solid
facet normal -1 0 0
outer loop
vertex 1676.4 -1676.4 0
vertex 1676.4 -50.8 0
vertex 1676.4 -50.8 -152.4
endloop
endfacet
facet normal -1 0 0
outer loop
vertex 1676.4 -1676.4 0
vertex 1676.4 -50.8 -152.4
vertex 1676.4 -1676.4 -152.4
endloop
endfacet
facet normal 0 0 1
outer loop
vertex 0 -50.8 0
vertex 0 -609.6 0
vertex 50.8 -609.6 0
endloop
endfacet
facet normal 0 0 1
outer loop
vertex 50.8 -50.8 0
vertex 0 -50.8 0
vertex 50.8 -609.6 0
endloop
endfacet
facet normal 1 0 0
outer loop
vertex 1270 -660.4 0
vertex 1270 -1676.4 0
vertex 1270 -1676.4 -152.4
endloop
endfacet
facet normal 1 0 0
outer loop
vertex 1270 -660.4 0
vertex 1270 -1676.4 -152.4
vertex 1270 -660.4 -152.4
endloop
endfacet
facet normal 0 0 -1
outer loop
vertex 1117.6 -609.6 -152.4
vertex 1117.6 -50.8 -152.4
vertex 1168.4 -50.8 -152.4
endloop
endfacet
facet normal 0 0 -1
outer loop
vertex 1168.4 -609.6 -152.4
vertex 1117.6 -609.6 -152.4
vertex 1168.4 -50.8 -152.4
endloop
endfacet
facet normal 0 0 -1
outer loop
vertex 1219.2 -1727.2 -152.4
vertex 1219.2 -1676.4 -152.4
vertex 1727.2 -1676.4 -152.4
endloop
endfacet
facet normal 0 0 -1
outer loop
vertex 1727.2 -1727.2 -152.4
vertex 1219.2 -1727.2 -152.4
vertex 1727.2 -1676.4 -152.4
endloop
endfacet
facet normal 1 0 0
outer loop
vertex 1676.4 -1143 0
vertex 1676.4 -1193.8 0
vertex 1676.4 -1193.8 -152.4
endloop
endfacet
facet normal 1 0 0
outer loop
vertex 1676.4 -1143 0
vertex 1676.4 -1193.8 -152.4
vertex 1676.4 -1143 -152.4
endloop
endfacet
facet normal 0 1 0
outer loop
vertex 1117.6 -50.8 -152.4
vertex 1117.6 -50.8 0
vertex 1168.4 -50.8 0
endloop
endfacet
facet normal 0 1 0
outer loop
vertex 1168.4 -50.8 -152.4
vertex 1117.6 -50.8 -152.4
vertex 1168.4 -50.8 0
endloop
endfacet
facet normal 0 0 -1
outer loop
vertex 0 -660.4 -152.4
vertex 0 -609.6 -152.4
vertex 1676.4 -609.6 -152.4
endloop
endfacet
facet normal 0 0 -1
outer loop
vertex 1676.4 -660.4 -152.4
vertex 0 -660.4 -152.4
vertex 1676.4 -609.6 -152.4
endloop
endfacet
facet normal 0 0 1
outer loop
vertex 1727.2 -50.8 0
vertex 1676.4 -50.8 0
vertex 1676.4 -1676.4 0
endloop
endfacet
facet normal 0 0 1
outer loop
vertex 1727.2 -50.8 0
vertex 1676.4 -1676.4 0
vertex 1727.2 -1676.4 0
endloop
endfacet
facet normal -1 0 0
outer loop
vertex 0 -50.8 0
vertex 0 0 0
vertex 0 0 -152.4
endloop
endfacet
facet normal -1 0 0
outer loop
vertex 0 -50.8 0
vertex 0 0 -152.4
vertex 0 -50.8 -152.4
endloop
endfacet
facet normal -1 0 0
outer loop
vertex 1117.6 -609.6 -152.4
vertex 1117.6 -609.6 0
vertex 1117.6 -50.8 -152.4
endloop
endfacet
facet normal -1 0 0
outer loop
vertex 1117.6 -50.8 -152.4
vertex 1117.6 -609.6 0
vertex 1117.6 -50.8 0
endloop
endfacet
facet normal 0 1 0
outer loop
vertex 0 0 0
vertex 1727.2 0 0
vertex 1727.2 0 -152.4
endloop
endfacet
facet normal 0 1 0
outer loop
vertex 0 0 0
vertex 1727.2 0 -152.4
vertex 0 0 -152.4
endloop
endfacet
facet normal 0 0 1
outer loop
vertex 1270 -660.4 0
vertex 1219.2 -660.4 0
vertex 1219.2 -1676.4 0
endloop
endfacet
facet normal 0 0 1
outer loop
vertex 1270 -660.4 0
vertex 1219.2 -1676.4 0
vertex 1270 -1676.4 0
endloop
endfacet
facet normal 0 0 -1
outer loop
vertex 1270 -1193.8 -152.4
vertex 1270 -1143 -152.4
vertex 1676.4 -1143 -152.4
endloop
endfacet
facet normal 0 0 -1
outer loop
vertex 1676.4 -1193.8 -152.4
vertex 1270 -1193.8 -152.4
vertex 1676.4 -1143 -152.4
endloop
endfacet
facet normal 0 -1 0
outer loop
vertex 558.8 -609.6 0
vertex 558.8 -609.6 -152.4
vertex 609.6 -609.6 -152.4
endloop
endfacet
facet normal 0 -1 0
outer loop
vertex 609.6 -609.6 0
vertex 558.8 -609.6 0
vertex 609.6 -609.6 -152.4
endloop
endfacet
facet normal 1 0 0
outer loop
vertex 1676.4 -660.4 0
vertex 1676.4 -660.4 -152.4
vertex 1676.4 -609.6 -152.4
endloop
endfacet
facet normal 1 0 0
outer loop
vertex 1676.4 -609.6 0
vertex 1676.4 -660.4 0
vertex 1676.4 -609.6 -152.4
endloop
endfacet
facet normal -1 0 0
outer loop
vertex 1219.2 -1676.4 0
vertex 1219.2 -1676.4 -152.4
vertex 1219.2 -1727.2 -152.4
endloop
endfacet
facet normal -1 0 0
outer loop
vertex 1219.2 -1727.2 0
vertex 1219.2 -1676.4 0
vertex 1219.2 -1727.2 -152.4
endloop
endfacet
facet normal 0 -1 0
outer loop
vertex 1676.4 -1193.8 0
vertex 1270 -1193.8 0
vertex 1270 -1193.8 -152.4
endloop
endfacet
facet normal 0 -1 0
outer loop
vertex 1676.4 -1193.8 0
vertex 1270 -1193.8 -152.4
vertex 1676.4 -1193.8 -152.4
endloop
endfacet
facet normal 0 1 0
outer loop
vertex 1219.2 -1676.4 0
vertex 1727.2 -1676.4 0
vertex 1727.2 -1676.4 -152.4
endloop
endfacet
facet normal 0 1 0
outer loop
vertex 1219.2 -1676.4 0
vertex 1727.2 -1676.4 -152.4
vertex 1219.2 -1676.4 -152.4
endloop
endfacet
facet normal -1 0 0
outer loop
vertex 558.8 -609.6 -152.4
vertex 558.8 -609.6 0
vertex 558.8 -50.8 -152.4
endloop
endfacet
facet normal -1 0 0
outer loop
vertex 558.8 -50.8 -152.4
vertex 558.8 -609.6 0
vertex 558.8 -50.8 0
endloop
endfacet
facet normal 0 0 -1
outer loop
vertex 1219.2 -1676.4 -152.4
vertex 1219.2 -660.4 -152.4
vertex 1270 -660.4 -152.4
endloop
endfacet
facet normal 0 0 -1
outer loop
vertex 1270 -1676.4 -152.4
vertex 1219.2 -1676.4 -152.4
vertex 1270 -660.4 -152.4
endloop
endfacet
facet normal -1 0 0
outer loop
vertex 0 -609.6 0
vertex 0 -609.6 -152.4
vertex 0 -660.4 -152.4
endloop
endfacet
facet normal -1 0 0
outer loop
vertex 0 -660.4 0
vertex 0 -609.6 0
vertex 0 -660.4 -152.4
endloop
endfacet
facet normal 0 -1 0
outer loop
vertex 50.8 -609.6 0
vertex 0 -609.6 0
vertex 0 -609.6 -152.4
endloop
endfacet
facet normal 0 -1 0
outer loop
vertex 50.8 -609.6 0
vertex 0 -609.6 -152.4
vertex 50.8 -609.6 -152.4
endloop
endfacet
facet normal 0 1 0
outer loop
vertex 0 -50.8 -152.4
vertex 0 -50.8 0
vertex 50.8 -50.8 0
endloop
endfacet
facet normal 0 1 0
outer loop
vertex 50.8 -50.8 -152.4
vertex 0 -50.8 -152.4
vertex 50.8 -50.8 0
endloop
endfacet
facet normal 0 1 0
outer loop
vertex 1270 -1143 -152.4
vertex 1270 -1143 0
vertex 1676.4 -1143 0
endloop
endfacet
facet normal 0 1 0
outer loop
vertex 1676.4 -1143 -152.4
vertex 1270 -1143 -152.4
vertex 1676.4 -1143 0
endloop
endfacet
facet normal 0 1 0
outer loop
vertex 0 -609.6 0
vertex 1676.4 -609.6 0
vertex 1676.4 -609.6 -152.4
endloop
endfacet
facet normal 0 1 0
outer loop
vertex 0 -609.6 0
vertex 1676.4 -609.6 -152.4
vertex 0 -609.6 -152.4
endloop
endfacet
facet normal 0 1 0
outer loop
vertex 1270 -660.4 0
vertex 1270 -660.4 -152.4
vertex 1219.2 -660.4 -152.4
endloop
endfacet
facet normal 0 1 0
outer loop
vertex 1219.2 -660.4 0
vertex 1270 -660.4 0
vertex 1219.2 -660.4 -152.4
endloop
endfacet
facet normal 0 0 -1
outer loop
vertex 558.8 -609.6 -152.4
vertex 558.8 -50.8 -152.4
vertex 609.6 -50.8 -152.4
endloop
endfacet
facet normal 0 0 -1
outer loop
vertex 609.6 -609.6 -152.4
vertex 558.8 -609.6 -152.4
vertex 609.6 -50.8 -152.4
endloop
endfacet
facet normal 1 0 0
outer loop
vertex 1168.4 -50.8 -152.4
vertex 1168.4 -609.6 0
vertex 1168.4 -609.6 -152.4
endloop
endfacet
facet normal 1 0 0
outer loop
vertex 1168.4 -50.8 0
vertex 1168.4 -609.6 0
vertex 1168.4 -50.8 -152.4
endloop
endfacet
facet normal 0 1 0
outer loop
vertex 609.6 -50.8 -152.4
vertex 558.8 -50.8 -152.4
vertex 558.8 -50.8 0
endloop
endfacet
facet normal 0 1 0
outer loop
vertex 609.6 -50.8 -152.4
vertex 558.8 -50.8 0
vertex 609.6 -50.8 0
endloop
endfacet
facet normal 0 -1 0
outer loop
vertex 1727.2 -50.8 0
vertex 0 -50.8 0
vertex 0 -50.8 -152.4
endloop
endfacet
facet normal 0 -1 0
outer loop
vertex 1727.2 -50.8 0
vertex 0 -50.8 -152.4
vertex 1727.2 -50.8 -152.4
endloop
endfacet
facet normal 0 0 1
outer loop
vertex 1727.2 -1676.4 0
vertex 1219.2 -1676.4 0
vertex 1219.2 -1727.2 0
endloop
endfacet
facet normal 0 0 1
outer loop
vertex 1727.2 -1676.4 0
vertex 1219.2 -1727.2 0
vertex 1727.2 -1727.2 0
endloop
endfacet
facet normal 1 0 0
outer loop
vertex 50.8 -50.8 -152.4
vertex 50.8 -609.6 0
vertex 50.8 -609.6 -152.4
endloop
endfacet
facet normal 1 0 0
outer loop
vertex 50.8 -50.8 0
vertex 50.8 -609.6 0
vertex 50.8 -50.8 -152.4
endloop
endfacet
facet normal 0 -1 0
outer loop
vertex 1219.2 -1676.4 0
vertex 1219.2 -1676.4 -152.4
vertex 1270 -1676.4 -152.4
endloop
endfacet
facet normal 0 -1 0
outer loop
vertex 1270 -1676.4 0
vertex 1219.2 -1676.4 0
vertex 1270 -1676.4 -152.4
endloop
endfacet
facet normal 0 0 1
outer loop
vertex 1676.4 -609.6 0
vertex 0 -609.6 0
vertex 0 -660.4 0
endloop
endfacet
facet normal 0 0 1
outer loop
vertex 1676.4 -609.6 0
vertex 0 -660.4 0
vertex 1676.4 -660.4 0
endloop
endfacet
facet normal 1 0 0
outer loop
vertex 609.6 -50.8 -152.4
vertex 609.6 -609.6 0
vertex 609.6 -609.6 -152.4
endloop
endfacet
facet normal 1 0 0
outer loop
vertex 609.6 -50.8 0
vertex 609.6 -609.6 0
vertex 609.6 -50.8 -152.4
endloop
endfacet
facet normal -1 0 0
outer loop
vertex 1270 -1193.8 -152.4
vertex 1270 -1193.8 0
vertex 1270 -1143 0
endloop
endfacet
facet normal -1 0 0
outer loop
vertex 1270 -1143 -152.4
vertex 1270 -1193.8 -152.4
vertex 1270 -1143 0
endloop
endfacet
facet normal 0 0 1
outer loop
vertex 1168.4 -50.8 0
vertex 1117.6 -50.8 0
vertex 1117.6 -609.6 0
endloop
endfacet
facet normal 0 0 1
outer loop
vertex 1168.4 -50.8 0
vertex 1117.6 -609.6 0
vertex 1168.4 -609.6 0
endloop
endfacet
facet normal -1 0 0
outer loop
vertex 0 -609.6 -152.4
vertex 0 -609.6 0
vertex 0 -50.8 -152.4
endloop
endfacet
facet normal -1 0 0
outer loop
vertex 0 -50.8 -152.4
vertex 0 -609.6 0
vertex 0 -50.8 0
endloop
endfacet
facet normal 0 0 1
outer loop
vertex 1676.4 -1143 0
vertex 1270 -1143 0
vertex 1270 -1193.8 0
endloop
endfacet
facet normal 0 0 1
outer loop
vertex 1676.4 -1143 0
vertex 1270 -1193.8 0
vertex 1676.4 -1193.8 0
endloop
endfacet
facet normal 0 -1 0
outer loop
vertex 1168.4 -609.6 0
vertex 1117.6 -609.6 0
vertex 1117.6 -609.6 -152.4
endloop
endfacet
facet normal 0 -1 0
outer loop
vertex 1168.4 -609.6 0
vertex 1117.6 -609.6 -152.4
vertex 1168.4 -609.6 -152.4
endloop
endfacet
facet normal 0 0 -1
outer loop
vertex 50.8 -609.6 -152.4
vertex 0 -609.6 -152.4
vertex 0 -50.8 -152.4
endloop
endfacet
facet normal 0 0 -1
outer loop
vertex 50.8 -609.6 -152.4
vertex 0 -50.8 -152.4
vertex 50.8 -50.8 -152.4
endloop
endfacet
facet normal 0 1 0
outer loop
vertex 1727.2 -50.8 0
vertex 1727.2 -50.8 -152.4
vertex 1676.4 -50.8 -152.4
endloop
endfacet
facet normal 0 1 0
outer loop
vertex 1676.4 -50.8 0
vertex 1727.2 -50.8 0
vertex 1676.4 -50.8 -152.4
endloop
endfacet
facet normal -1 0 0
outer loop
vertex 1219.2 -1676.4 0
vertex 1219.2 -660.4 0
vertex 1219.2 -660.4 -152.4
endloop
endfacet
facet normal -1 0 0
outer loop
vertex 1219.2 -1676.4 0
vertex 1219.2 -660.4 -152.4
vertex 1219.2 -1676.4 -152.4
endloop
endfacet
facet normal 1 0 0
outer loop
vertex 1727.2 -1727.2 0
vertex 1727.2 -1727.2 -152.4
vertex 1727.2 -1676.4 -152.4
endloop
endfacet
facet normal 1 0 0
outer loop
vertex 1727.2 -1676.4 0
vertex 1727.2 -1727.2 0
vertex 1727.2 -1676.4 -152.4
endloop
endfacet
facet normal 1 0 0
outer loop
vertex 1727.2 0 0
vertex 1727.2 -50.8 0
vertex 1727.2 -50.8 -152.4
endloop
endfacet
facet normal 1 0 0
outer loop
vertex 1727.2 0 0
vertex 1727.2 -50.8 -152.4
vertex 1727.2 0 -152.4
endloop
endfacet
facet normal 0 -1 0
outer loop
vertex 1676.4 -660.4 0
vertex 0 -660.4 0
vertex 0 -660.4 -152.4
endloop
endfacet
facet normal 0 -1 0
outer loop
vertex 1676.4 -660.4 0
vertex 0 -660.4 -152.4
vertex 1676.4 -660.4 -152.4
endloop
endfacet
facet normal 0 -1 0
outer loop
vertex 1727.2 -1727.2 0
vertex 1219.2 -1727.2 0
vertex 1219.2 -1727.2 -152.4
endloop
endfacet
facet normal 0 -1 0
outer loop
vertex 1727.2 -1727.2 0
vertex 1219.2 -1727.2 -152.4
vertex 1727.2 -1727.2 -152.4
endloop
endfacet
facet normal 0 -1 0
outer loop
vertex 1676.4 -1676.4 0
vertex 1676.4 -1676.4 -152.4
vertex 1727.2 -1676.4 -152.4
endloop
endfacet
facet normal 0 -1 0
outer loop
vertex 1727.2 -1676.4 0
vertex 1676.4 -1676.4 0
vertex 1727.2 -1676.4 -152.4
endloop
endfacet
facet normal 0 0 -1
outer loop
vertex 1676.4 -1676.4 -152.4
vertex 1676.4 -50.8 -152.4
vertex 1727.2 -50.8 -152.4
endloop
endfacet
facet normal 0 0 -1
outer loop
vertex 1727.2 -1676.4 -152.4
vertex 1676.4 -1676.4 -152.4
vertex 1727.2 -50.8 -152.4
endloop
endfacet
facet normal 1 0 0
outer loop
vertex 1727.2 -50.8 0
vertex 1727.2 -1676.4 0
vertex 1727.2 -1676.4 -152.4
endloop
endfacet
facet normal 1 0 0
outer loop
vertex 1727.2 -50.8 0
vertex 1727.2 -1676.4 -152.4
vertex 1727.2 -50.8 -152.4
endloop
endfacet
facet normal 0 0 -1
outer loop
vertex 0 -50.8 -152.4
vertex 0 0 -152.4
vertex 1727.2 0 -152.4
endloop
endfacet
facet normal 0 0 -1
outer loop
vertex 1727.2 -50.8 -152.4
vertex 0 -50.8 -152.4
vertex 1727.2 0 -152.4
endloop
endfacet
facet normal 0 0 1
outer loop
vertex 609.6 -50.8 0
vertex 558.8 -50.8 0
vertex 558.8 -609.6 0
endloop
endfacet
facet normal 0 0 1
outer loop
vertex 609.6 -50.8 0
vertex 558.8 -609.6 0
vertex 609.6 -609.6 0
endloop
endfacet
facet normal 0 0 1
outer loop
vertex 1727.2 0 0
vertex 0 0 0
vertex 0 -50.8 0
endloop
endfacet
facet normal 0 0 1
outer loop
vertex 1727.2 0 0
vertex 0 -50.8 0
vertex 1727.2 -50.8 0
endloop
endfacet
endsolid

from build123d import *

# Parameters (mm, degrees)
F1_DEPTH = 152.4
F0_W     = 50.8
F0_H     = 558.8
F2_DEPTH = 152.4
F3_DEPTH = 152.4
F4_DEPTH = 152.4
F5_DEPTH = 152.4
F0_W_2   = 406.4
F0_H_2   = 50.8
F6_DEPTH = 152.4
F7_DEPTH = 152.4
F8_DEPTH = 152.4
F9_DEPTH = 152.4


with BuildPart() as f1:
    # F0 (on Top) → F1 (new body)
    with BuildSketch(Plane.XY):
        Polygon((1727.2, 0), (0, 0), (0, -50.8), (50.8, -50.8), (558.8, -50.8), (609.6, -50.8), (1117.6, -50.8), (1168.4, -50.8), (1676.4, -50.8), (1727.2, -50.8), align=None)
    extrude(amount=-F1_DEPTH)


with BuildPart() as f2:
    # F0 (on Top) → F2 (new body)
    with BuildSketch(Plane.XY):
        with Locations((25.4, -330.2)):
            Rectangle(F0_W, F0_H)
    extrude(amount=-F2_DEPTH)


with BuildPart() as f3:
    # F0 (on Top) → F3 (new body)
    with BuildSketch(Plane.XY):
        Polygon((50.8, -609.6), (0, -609.6), (0, -660.4), (1219.2, -660.4), (1270, -660.4), (1676.4, -660.4), (1676.4, -609.6), (1168.4, -609.6), (1117.6, -609.6), (609.6, -609.6), (558.8, -609.6), align=None)
    extrude(amount=-F3_DEPTH)


with BuildPart() as f4:
    # F0 (on Top) → F4 (new body)
    with BuildSketch(Plane.XY):
        with Locations((584.2, -330.2)):
            Rectangle(F0_W, F0_H)
    extrude(amount=-F4_DEPTH)


with BuildPart() as f5:
    # F0 (on Top) → F5 (new body)
    with BuildSketch(Plane.XY):
        with Locations((1143, -330.2)):
            Rectangle(F0_W, F0_H)
    extrude(amount=-F5_DEPTH)


with BuildPart() as f6:
    # F0 (on Top) → F6 (new body)
    with BuildSketch(Plane.XY):
        with Locations((1473.2, -1168.4)):
            Rectangle(F0_W_2, F0_H_2)
    extrude(amount=-F6_DEPTH)


with BuildPart() as f7:
    # F0 (on Top) → F7 (new body)
    with BuildSketch(Plane.XY):
        Polygon((1727.2, -1727.2), (1727.2, -1676.4), (1676.4, -1676.4), (1270, -1676.4), (1219.2, -1676.4), (1219.2, -1727.2), align=None)
    extrude(amount=-F7_DEPTH)


with BuildPart() as f8:
    # F0 (on Top) → F8 (new body)
    with BuildSketch(Plane.XY):
        Polygon((1727.2, -1676.4), (1727.2, -50.8), (1676.4, -50.8), (1676.4, -609.6), (1676.4, -660.4), (1676.4, -1143), (1676.4, -1193.8), (1676.4, -1676.4), align=None)
    extrude(amount=-F8_DEPTH)


with BuildPart() as f9:
    # F0 (on Top) → F9 (new body)
    with BuildSketch(Plane.XY):
        Polygon((1270, -660.4), (1219.2, -660.4), (1219.2, -1676.4), (1270, -1676.4), (1270, -1193.8), (1270, -1143), align=None)
    extrude(amount=-F9_DEPTH)


solid = Compound([f1.part, f2.part, f3.part, f4.part, f5.part, f6.part, f7.part, f8.part, f9.part])
